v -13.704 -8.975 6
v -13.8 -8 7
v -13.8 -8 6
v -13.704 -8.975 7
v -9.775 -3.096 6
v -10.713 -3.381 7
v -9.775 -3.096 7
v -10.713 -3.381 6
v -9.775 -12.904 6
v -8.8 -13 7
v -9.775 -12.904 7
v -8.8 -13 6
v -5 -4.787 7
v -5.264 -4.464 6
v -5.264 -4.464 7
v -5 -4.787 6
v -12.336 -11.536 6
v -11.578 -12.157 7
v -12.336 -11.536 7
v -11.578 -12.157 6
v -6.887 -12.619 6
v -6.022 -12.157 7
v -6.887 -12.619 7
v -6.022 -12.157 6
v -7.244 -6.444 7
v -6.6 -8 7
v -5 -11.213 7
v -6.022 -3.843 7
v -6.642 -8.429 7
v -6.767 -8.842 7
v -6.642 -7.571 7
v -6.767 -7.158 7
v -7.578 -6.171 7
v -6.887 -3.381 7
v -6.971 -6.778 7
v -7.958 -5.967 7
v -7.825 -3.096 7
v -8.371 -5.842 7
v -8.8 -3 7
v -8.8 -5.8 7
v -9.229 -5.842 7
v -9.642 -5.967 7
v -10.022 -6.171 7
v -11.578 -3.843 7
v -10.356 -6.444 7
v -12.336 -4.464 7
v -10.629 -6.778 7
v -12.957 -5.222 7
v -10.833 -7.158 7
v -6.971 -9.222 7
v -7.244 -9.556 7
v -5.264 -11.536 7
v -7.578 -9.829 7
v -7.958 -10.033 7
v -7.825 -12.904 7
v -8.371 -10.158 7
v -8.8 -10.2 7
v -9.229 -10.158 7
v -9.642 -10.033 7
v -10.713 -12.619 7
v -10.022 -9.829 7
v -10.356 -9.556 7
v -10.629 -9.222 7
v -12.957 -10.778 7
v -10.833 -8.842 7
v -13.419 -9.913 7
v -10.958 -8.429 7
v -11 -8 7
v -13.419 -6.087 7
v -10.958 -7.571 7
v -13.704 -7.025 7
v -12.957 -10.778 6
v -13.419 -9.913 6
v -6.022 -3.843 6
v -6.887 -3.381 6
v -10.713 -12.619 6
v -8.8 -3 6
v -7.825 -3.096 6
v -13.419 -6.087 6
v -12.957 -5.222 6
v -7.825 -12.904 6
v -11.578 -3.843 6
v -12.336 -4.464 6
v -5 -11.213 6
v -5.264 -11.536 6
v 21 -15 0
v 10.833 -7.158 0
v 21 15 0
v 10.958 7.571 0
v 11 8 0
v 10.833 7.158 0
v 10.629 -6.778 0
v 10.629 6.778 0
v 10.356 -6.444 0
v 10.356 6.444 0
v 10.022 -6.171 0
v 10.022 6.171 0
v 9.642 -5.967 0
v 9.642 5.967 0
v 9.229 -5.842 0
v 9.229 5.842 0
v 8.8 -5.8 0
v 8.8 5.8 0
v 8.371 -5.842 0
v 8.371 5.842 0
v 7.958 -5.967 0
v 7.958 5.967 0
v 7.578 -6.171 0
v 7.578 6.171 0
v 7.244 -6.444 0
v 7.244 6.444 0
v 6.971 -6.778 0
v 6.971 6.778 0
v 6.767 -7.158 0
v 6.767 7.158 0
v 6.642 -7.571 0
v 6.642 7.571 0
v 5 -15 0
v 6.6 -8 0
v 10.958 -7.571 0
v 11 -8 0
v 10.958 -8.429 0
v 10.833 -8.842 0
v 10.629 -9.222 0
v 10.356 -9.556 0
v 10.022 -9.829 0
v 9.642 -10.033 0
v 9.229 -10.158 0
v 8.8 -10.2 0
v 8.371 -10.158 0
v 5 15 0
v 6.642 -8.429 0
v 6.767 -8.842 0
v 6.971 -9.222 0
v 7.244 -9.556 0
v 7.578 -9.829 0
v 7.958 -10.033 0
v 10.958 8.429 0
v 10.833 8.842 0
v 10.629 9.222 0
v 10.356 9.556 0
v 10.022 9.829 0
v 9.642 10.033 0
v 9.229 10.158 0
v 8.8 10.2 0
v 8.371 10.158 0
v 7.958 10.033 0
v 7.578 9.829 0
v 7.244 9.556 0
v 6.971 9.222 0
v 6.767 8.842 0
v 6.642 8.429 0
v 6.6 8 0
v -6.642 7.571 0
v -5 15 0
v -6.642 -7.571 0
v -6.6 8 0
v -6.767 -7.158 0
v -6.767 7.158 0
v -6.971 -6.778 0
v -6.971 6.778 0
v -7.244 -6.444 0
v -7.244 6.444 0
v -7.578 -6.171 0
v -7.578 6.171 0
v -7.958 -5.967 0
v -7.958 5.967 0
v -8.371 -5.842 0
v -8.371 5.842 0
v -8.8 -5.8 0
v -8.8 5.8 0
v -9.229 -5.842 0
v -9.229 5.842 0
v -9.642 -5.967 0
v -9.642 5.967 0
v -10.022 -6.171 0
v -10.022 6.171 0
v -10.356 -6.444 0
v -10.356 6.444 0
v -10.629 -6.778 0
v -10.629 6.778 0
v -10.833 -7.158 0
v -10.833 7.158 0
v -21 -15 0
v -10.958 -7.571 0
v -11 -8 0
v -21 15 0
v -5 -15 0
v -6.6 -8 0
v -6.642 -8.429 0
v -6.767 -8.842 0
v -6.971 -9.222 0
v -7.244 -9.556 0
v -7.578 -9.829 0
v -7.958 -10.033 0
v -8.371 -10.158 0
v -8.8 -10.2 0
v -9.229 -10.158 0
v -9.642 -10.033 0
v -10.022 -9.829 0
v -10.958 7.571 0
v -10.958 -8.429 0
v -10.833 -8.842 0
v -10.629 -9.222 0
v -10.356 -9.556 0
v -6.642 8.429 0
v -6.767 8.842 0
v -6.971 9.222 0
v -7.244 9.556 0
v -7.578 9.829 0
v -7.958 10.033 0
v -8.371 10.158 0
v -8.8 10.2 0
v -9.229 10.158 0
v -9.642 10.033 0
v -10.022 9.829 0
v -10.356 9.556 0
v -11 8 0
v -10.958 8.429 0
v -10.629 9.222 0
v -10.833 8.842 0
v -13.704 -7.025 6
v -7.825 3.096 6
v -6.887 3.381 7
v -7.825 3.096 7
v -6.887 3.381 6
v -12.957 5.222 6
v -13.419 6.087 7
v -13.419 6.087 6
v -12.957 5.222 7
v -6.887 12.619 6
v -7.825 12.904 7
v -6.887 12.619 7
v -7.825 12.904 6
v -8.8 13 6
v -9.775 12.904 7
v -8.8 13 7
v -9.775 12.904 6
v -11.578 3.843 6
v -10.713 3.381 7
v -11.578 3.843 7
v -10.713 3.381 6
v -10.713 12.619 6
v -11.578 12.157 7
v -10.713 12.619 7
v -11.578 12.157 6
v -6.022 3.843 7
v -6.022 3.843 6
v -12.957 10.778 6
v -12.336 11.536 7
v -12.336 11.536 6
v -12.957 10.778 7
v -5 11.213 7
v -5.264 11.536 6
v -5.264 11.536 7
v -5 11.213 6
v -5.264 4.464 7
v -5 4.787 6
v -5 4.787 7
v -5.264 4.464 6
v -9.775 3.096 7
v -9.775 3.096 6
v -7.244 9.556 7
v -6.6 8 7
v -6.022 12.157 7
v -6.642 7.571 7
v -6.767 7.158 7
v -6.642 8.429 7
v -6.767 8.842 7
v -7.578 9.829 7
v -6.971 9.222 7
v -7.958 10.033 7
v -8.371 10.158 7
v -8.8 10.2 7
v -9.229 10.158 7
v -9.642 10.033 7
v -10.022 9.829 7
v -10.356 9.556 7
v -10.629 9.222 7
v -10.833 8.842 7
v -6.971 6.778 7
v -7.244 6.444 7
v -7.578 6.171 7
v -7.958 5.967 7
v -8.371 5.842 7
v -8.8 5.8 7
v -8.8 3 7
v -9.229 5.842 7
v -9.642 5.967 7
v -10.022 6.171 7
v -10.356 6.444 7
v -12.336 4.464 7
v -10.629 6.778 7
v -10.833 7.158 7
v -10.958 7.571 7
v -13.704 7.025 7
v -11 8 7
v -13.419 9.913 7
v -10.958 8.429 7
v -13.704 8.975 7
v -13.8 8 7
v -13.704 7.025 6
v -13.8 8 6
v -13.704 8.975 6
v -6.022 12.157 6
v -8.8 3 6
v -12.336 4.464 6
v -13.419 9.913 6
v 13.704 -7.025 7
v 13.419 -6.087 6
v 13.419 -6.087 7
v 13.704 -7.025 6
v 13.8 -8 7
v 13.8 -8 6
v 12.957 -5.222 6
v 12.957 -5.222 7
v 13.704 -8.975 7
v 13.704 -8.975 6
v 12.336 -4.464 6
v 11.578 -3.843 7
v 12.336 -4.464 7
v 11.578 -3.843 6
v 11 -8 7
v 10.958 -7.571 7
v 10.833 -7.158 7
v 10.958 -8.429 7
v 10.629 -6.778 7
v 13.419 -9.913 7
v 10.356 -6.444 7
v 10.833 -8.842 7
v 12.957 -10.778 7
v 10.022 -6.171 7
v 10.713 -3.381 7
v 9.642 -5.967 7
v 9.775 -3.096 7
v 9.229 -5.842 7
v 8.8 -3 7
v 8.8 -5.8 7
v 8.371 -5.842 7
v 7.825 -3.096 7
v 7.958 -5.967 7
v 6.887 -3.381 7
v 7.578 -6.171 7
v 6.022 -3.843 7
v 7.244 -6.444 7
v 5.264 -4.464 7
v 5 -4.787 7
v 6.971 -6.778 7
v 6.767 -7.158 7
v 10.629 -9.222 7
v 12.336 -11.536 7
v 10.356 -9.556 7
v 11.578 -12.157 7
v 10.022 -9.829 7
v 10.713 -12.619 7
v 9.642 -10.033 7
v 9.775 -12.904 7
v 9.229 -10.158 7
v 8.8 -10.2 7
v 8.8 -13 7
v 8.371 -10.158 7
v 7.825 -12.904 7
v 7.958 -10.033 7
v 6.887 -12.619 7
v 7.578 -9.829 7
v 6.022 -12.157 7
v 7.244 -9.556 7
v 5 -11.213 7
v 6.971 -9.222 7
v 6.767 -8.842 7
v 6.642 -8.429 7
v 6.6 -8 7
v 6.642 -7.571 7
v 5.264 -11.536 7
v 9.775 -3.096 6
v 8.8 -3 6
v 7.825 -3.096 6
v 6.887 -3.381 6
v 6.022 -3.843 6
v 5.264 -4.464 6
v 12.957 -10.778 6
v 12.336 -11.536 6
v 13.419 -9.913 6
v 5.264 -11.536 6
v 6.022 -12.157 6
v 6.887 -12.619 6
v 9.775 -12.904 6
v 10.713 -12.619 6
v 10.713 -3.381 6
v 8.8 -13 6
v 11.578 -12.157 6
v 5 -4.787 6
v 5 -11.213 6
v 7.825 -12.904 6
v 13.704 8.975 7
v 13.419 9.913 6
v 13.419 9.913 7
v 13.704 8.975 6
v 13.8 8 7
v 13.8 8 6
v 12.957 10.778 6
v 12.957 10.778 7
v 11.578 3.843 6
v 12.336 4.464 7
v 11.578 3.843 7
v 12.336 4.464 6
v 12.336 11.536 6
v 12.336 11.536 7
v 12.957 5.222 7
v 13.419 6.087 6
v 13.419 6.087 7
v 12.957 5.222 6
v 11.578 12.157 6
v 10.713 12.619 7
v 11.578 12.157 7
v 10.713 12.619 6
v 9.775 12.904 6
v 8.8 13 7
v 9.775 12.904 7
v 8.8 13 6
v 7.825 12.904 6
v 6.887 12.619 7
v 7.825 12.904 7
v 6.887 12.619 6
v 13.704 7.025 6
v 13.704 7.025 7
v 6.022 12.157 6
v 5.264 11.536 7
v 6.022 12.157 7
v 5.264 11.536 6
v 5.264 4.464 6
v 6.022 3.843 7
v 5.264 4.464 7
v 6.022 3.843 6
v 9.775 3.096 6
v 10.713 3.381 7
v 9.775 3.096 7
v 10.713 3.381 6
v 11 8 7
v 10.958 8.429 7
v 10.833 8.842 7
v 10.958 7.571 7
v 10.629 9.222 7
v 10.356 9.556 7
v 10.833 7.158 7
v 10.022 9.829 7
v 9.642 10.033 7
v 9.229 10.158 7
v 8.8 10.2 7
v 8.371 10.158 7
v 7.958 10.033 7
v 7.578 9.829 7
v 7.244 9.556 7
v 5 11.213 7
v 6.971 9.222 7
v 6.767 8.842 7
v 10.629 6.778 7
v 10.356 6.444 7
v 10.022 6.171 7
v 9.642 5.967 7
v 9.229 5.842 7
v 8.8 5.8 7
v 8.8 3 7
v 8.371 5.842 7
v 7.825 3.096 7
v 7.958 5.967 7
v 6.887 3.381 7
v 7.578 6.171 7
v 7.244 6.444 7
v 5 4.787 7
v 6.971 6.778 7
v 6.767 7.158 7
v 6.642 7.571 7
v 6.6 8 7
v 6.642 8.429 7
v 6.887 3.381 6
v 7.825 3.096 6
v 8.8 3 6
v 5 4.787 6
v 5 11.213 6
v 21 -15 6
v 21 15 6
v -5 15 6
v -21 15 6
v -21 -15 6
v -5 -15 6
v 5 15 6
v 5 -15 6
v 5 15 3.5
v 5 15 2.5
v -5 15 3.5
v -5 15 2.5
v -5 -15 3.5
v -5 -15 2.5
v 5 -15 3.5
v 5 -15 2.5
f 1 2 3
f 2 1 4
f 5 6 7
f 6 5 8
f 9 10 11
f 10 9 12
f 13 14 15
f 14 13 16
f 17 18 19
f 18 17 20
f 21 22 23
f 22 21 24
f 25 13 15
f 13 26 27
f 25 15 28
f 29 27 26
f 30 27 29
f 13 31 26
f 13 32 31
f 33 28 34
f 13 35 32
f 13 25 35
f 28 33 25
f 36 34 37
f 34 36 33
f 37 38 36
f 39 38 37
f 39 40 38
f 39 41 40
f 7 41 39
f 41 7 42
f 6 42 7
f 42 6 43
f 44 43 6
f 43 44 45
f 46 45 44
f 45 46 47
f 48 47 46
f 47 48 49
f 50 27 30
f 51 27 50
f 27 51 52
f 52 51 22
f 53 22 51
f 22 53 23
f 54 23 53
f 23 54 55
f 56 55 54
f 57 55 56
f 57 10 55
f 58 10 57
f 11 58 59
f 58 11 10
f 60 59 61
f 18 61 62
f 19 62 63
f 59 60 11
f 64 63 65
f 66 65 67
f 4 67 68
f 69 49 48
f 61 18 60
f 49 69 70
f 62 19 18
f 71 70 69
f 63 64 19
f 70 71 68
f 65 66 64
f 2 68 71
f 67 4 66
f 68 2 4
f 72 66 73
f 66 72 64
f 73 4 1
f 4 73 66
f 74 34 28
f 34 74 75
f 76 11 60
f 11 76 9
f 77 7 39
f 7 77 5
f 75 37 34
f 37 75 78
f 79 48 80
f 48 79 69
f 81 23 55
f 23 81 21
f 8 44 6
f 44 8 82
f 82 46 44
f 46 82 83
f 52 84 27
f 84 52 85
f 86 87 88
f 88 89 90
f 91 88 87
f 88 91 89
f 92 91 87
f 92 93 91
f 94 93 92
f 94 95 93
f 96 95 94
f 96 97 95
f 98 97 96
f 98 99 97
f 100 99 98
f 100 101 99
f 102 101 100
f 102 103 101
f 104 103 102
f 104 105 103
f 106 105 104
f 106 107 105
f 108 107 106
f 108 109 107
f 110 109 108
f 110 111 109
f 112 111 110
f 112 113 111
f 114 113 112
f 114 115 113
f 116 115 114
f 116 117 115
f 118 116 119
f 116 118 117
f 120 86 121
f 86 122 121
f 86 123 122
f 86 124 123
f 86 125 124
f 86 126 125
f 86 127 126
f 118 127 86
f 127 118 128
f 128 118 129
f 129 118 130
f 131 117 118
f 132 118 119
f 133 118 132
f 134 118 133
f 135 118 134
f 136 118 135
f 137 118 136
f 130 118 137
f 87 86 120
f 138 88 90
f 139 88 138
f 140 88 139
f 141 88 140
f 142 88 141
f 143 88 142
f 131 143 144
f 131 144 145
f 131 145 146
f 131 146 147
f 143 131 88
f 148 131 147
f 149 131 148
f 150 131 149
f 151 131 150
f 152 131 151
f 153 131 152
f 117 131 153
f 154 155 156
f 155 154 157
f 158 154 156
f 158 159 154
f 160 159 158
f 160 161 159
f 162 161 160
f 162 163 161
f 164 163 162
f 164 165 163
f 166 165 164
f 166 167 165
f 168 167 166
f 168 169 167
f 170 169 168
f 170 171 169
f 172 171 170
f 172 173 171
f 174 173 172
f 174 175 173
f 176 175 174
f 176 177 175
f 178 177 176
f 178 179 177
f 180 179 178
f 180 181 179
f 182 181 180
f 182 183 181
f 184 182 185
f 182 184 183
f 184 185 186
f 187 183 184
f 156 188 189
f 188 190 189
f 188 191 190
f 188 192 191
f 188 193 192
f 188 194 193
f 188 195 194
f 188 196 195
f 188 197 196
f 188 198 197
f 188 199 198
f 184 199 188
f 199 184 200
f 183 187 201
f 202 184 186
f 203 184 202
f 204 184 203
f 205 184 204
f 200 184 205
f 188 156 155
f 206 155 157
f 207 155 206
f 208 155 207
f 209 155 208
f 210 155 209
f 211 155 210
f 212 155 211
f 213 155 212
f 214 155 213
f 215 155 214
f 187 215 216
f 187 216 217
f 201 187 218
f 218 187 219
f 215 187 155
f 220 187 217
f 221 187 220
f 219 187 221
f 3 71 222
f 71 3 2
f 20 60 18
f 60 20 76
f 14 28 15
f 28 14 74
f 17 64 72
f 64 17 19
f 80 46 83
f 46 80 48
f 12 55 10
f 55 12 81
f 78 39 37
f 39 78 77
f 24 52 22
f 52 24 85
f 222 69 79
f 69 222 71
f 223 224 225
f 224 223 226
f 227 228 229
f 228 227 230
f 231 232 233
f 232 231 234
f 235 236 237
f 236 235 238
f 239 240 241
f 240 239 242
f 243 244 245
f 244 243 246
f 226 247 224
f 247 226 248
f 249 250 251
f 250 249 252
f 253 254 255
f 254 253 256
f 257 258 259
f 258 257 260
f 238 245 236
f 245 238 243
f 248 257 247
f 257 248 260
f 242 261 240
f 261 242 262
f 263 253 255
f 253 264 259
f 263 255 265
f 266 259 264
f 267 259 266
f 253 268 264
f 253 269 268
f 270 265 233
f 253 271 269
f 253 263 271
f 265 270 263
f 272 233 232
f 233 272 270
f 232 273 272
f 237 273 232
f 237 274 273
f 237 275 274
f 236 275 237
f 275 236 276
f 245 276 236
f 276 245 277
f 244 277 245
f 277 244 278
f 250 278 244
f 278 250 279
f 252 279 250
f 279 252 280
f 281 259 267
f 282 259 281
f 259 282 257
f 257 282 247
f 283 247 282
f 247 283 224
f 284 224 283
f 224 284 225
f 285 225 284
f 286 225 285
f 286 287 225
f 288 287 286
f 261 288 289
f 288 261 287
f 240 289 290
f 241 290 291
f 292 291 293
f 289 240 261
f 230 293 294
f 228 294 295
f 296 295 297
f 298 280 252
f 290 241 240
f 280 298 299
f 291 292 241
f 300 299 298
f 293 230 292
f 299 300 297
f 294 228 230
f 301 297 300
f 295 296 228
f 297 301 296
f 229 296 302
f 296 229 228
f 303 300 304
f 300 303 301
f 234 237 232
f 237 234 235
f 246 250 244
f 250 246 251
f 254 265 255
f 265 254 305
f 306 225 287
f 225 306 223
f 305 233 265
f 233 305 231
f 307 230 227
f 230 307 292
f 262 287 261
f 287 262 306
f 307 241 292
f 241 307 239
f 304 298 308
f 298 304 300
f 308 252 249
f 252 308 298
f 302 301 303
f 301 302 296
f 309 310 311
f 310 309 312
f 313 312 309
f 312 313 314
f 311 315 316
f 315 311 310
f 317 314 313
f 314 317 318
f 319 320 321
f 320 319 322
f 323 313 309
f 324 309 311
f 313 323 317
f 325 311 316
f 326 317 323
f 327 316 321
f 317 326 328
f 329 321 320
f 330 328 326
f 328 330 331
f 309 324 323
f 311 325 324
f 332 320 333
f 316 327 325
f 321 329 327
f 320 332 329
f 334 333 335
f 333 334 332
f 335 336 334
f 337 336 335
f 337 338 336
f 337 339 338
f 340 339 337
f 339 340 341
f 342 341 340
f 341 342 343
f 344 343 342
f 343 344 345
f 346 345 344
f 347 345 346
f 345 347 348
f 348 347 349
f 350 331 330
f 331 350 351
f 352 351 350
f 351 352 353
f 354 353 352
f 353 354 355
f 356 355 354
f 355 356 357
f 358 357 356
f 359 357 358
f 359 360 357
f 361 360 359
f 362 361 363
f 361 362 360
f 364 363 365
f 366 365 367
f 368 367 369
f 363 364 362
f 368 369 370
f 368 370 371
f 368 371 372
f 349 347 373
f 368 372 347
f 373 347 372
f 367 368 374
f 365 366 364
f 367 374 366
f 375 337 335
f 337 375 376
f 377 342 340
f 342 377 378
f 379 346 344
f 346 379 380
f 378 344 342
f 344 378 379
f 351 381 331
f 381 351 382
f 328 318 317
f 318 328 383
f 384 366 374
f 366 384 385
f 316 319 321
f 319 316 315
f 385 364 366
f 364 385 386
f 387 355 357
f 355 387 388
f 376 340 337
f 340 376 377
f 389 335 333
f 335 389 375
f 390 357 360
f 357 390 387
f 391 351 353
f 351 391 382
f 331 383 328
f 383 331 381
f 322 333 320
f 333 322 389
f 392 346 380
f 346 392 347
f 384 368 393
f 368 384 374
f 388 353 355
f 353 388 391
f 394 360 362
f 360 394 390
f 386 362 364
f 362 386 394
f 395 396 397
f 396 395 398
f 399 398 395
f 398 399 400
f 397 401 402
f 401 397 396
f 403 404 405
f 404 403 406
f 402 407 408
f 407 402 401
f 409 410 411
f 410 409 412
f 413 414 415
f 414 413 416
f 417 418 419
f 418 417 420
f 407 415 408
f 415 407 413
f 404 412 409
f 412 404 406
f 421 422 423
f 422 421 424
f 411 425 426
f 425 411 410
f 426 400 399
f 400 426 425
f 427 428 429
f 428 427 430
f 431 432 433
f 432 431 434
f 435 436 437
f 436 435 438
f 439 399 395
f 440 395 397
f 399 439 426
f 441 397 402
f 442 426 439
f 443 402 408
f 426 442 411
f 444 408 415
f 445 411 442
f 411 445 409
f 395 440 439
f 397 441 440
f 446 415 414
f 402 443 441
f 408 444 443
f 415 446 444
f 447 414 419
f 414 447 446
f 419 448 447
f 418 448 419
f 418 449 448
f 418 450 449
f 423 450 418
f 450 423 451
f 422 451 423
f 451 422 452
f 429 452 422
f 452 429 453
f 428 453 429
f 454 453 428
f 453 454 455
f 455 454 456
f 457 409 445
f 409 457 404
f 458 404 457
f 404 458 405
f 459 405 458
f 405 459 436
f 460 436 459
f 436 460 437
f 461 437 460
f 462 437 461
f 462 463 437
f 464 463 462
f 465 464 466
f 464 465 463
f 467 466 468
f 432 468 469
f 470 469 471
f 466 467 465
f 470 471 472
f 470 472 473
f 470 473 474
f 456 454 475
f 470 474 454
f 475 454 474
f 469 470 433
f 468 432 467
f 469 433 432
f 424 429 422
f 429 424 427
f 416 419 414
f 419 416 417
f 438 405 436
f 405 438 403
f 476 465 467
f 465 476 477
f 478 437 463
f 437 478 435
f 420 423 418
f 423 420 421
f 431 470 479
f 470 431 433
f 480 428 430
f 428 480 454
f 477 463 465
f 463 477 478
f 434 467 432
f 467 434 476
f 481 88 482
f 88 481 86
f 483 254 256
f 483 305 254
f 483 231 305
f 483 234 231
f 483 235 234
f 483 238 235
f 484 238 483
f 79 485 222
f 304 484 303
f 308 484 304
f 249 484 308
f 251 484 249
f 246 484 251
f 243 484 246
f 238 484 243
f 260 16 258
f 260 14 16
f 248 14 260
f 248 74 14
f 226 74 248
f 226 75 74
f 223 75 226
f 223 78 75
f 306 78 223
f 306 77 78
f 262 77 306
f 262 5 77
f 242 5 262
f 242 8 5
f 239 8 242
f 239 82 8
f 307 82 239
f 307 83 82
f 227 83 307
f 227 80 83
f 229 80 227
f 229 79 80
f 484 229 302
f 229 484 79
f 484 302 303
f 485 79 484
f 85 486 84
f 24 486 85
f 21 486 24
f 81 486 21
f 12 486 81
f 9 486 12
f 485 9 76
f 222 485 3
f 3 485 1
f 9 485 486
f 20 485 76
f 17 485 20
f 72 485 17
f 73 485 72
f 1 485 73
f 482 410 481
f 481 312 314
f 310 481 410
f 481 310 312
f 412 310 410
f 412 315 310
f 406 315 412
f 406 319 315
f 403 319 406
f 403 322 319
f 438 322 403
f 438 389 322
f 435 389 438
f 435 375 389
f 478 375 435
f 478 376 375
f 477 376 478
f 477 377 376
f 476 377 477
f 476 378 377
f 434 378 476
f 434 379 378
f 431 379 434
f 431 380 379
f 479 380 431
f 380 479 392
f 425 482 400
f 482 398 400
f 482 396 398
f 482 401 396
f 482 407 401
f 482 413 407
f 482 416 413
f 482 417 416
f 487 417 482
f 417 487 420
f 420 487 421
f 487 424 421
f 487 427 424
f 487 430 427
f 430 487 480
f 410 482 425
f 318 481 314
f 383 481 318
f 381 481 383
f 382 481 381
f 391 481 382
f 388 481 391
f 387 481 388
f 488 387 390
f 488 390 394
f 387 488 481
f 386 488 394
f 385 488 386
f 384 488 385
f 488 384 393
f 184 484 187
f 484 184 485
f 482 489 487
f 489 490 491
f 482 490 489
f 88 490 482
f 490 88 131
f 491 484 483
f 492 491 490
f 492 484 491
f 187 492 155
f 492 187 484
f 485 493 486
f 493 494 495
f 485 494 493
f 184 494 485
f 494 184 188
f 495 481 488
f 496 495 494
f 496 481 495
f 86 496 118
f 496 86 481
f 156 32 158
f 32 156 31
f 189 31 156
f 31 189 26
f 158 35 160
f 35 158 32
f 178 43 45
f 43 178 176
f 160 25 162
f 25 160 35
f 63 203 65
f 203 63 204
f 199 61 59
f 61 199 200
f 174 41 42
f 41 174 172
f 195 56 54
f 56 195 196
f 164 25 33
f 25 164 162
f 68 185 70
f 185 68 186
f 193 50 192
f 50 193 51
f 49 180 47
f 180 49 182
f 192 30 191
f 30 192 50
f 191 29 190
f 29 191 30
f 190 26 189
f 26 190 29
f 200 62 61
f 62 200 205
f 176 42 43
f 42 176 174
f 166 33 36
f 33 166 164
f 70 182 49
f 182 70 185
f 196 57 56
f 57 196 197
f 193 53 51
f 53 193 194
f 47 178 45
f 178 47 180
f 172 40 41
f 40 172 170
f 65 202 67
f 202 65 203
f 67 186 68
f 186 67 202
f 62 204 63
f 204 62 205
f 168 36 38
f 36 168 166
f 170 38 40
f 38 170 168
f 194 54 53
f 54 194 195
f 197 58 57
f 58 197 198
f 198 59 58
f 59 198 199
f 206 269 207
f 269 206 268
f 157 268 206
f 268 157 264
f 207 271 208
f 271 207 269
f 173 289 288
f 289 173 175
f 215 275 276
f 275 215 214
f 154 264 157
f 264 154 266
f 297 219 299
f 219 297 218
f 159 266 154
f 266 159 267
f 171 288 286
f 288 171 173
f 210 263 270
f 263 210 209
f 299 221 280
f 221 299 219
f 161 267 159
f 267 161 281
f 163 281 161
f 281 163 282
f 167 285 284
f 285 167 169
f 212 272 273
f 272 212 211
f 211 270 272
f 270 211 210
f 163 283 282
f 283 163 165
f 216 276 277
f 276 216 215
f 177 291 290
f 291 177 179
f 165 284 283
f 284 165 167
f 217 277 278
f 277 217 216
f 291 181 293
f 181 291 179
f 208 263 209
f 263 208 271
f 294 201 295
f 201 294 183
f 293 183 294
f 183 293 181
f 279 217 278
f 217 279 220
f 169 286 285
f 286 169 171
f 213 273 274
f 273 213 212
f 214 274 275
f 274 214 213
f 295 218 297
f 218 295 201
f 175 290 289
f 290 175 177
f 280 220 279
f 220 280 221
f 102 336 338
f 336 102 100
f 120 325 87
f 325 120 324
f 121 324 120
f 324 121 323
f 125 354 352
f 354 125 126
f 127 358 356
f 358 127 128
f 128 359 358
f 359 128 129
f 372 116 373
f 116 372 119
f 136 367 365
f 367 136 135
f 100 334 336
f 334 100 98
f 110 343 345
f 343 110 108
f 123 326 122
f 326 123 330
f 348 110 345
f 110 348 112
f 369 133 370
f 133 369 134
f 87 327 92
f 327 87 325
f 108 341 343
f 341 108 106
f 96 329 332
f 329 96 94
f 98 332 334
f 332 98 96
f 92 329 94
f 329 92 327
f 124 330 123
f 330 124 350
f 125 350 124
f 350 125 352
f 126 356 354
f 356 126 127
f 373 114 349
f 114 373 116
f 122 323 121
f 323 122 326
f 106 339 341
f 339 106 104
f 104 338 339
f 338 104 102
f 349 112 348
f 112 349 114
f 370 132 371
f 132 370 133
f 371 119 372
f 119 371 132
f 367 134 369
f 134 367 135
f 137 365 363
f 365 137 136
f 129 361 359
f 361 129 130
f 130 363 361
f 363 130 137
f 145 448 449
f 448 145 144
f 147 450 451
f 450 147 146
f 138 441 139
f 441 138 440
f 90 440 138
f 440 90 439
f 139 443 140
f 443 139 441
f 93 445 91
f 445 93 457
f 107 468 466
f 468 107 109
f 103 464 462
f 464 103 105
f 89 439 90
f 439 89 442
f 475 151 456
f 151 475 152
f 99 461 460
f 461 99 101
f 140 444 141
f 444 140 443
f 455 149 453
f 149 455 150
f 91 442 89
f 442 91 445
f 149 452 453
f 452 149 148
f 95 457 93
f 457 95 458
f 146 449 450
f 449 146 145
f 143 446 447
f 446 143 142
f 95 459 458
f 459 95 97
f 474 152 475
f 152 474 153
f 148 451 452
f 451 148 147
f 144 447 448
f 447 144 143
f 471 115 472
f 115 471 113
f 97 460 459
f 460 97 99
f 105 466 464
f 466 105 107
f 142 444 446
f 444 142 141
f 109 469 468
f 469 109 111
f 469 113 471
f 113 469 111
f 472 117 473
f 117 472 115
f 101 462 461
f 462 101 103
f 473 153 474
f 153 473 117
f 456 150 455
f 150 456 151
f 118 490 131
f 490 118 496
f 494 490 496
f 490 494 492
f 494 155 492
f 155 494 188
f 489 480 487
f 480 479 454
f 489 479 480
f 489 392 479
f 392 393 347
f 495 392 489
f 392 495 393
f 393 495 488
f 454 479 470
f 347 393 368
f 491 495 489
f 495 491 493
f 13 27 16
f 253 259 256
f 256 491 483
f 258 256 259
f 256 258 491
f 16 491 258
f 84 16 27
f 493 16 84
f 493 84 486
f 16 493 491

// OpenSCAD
$fn = 32;

// ----------------------------------------------------------------------
// Living hinge: 42 x 30 mm plates, 1 mm flexible web
// ----------------------------------------------------------------------

// --- parameters (mm) ---
plate_len = 16;           // plate length outside the web
plate_w = 30;             // plate width
thick = 6;                // plate thickness
web_half = 5;             // half width of the flex band
web_t = 1;                // flexible web thickness
web_z = 2.5;              // web position inside the thickness
boss_d = 10;              // screw boss diameter
boss_h = 7;               // screw boss height
boss_x = 8.8;             // screw boss distance from the web
screw_d = 4.4;            // screw hole

difference() {
  union() {
    /* one flat strip, later thinned at the middle */
    translate([-21, -15, 0]) cube([42, 30, 6]);
    /* screw bosses, sunk 0.5 mm into the plates */
    for (sx = [-8.8, 8.8]) {
      for (sy = [-8, 8]) {
        translate([sx, sy, 0]) cylinder(h = boss_h, d = boss_d);
      }
    }
  }
  /* channel from below: leaves the web on top of it */
  translate([-5, -17.5, -2.5]) cube([10, 35, 5]);
  /* channel from above: thins the web down to web_t */
  translate([-5, -17.5, 3.5]) cube([10, 35, 5]);
  /* screw holes through the bosses */
  for (sx = [-8.8, 8.8]) {
    for (sy = [-8, 8]) {
      translate([sx, sy, -2.5]) cylinder(h = boss_h + 5, d = screw_d);
    }
  }
}
